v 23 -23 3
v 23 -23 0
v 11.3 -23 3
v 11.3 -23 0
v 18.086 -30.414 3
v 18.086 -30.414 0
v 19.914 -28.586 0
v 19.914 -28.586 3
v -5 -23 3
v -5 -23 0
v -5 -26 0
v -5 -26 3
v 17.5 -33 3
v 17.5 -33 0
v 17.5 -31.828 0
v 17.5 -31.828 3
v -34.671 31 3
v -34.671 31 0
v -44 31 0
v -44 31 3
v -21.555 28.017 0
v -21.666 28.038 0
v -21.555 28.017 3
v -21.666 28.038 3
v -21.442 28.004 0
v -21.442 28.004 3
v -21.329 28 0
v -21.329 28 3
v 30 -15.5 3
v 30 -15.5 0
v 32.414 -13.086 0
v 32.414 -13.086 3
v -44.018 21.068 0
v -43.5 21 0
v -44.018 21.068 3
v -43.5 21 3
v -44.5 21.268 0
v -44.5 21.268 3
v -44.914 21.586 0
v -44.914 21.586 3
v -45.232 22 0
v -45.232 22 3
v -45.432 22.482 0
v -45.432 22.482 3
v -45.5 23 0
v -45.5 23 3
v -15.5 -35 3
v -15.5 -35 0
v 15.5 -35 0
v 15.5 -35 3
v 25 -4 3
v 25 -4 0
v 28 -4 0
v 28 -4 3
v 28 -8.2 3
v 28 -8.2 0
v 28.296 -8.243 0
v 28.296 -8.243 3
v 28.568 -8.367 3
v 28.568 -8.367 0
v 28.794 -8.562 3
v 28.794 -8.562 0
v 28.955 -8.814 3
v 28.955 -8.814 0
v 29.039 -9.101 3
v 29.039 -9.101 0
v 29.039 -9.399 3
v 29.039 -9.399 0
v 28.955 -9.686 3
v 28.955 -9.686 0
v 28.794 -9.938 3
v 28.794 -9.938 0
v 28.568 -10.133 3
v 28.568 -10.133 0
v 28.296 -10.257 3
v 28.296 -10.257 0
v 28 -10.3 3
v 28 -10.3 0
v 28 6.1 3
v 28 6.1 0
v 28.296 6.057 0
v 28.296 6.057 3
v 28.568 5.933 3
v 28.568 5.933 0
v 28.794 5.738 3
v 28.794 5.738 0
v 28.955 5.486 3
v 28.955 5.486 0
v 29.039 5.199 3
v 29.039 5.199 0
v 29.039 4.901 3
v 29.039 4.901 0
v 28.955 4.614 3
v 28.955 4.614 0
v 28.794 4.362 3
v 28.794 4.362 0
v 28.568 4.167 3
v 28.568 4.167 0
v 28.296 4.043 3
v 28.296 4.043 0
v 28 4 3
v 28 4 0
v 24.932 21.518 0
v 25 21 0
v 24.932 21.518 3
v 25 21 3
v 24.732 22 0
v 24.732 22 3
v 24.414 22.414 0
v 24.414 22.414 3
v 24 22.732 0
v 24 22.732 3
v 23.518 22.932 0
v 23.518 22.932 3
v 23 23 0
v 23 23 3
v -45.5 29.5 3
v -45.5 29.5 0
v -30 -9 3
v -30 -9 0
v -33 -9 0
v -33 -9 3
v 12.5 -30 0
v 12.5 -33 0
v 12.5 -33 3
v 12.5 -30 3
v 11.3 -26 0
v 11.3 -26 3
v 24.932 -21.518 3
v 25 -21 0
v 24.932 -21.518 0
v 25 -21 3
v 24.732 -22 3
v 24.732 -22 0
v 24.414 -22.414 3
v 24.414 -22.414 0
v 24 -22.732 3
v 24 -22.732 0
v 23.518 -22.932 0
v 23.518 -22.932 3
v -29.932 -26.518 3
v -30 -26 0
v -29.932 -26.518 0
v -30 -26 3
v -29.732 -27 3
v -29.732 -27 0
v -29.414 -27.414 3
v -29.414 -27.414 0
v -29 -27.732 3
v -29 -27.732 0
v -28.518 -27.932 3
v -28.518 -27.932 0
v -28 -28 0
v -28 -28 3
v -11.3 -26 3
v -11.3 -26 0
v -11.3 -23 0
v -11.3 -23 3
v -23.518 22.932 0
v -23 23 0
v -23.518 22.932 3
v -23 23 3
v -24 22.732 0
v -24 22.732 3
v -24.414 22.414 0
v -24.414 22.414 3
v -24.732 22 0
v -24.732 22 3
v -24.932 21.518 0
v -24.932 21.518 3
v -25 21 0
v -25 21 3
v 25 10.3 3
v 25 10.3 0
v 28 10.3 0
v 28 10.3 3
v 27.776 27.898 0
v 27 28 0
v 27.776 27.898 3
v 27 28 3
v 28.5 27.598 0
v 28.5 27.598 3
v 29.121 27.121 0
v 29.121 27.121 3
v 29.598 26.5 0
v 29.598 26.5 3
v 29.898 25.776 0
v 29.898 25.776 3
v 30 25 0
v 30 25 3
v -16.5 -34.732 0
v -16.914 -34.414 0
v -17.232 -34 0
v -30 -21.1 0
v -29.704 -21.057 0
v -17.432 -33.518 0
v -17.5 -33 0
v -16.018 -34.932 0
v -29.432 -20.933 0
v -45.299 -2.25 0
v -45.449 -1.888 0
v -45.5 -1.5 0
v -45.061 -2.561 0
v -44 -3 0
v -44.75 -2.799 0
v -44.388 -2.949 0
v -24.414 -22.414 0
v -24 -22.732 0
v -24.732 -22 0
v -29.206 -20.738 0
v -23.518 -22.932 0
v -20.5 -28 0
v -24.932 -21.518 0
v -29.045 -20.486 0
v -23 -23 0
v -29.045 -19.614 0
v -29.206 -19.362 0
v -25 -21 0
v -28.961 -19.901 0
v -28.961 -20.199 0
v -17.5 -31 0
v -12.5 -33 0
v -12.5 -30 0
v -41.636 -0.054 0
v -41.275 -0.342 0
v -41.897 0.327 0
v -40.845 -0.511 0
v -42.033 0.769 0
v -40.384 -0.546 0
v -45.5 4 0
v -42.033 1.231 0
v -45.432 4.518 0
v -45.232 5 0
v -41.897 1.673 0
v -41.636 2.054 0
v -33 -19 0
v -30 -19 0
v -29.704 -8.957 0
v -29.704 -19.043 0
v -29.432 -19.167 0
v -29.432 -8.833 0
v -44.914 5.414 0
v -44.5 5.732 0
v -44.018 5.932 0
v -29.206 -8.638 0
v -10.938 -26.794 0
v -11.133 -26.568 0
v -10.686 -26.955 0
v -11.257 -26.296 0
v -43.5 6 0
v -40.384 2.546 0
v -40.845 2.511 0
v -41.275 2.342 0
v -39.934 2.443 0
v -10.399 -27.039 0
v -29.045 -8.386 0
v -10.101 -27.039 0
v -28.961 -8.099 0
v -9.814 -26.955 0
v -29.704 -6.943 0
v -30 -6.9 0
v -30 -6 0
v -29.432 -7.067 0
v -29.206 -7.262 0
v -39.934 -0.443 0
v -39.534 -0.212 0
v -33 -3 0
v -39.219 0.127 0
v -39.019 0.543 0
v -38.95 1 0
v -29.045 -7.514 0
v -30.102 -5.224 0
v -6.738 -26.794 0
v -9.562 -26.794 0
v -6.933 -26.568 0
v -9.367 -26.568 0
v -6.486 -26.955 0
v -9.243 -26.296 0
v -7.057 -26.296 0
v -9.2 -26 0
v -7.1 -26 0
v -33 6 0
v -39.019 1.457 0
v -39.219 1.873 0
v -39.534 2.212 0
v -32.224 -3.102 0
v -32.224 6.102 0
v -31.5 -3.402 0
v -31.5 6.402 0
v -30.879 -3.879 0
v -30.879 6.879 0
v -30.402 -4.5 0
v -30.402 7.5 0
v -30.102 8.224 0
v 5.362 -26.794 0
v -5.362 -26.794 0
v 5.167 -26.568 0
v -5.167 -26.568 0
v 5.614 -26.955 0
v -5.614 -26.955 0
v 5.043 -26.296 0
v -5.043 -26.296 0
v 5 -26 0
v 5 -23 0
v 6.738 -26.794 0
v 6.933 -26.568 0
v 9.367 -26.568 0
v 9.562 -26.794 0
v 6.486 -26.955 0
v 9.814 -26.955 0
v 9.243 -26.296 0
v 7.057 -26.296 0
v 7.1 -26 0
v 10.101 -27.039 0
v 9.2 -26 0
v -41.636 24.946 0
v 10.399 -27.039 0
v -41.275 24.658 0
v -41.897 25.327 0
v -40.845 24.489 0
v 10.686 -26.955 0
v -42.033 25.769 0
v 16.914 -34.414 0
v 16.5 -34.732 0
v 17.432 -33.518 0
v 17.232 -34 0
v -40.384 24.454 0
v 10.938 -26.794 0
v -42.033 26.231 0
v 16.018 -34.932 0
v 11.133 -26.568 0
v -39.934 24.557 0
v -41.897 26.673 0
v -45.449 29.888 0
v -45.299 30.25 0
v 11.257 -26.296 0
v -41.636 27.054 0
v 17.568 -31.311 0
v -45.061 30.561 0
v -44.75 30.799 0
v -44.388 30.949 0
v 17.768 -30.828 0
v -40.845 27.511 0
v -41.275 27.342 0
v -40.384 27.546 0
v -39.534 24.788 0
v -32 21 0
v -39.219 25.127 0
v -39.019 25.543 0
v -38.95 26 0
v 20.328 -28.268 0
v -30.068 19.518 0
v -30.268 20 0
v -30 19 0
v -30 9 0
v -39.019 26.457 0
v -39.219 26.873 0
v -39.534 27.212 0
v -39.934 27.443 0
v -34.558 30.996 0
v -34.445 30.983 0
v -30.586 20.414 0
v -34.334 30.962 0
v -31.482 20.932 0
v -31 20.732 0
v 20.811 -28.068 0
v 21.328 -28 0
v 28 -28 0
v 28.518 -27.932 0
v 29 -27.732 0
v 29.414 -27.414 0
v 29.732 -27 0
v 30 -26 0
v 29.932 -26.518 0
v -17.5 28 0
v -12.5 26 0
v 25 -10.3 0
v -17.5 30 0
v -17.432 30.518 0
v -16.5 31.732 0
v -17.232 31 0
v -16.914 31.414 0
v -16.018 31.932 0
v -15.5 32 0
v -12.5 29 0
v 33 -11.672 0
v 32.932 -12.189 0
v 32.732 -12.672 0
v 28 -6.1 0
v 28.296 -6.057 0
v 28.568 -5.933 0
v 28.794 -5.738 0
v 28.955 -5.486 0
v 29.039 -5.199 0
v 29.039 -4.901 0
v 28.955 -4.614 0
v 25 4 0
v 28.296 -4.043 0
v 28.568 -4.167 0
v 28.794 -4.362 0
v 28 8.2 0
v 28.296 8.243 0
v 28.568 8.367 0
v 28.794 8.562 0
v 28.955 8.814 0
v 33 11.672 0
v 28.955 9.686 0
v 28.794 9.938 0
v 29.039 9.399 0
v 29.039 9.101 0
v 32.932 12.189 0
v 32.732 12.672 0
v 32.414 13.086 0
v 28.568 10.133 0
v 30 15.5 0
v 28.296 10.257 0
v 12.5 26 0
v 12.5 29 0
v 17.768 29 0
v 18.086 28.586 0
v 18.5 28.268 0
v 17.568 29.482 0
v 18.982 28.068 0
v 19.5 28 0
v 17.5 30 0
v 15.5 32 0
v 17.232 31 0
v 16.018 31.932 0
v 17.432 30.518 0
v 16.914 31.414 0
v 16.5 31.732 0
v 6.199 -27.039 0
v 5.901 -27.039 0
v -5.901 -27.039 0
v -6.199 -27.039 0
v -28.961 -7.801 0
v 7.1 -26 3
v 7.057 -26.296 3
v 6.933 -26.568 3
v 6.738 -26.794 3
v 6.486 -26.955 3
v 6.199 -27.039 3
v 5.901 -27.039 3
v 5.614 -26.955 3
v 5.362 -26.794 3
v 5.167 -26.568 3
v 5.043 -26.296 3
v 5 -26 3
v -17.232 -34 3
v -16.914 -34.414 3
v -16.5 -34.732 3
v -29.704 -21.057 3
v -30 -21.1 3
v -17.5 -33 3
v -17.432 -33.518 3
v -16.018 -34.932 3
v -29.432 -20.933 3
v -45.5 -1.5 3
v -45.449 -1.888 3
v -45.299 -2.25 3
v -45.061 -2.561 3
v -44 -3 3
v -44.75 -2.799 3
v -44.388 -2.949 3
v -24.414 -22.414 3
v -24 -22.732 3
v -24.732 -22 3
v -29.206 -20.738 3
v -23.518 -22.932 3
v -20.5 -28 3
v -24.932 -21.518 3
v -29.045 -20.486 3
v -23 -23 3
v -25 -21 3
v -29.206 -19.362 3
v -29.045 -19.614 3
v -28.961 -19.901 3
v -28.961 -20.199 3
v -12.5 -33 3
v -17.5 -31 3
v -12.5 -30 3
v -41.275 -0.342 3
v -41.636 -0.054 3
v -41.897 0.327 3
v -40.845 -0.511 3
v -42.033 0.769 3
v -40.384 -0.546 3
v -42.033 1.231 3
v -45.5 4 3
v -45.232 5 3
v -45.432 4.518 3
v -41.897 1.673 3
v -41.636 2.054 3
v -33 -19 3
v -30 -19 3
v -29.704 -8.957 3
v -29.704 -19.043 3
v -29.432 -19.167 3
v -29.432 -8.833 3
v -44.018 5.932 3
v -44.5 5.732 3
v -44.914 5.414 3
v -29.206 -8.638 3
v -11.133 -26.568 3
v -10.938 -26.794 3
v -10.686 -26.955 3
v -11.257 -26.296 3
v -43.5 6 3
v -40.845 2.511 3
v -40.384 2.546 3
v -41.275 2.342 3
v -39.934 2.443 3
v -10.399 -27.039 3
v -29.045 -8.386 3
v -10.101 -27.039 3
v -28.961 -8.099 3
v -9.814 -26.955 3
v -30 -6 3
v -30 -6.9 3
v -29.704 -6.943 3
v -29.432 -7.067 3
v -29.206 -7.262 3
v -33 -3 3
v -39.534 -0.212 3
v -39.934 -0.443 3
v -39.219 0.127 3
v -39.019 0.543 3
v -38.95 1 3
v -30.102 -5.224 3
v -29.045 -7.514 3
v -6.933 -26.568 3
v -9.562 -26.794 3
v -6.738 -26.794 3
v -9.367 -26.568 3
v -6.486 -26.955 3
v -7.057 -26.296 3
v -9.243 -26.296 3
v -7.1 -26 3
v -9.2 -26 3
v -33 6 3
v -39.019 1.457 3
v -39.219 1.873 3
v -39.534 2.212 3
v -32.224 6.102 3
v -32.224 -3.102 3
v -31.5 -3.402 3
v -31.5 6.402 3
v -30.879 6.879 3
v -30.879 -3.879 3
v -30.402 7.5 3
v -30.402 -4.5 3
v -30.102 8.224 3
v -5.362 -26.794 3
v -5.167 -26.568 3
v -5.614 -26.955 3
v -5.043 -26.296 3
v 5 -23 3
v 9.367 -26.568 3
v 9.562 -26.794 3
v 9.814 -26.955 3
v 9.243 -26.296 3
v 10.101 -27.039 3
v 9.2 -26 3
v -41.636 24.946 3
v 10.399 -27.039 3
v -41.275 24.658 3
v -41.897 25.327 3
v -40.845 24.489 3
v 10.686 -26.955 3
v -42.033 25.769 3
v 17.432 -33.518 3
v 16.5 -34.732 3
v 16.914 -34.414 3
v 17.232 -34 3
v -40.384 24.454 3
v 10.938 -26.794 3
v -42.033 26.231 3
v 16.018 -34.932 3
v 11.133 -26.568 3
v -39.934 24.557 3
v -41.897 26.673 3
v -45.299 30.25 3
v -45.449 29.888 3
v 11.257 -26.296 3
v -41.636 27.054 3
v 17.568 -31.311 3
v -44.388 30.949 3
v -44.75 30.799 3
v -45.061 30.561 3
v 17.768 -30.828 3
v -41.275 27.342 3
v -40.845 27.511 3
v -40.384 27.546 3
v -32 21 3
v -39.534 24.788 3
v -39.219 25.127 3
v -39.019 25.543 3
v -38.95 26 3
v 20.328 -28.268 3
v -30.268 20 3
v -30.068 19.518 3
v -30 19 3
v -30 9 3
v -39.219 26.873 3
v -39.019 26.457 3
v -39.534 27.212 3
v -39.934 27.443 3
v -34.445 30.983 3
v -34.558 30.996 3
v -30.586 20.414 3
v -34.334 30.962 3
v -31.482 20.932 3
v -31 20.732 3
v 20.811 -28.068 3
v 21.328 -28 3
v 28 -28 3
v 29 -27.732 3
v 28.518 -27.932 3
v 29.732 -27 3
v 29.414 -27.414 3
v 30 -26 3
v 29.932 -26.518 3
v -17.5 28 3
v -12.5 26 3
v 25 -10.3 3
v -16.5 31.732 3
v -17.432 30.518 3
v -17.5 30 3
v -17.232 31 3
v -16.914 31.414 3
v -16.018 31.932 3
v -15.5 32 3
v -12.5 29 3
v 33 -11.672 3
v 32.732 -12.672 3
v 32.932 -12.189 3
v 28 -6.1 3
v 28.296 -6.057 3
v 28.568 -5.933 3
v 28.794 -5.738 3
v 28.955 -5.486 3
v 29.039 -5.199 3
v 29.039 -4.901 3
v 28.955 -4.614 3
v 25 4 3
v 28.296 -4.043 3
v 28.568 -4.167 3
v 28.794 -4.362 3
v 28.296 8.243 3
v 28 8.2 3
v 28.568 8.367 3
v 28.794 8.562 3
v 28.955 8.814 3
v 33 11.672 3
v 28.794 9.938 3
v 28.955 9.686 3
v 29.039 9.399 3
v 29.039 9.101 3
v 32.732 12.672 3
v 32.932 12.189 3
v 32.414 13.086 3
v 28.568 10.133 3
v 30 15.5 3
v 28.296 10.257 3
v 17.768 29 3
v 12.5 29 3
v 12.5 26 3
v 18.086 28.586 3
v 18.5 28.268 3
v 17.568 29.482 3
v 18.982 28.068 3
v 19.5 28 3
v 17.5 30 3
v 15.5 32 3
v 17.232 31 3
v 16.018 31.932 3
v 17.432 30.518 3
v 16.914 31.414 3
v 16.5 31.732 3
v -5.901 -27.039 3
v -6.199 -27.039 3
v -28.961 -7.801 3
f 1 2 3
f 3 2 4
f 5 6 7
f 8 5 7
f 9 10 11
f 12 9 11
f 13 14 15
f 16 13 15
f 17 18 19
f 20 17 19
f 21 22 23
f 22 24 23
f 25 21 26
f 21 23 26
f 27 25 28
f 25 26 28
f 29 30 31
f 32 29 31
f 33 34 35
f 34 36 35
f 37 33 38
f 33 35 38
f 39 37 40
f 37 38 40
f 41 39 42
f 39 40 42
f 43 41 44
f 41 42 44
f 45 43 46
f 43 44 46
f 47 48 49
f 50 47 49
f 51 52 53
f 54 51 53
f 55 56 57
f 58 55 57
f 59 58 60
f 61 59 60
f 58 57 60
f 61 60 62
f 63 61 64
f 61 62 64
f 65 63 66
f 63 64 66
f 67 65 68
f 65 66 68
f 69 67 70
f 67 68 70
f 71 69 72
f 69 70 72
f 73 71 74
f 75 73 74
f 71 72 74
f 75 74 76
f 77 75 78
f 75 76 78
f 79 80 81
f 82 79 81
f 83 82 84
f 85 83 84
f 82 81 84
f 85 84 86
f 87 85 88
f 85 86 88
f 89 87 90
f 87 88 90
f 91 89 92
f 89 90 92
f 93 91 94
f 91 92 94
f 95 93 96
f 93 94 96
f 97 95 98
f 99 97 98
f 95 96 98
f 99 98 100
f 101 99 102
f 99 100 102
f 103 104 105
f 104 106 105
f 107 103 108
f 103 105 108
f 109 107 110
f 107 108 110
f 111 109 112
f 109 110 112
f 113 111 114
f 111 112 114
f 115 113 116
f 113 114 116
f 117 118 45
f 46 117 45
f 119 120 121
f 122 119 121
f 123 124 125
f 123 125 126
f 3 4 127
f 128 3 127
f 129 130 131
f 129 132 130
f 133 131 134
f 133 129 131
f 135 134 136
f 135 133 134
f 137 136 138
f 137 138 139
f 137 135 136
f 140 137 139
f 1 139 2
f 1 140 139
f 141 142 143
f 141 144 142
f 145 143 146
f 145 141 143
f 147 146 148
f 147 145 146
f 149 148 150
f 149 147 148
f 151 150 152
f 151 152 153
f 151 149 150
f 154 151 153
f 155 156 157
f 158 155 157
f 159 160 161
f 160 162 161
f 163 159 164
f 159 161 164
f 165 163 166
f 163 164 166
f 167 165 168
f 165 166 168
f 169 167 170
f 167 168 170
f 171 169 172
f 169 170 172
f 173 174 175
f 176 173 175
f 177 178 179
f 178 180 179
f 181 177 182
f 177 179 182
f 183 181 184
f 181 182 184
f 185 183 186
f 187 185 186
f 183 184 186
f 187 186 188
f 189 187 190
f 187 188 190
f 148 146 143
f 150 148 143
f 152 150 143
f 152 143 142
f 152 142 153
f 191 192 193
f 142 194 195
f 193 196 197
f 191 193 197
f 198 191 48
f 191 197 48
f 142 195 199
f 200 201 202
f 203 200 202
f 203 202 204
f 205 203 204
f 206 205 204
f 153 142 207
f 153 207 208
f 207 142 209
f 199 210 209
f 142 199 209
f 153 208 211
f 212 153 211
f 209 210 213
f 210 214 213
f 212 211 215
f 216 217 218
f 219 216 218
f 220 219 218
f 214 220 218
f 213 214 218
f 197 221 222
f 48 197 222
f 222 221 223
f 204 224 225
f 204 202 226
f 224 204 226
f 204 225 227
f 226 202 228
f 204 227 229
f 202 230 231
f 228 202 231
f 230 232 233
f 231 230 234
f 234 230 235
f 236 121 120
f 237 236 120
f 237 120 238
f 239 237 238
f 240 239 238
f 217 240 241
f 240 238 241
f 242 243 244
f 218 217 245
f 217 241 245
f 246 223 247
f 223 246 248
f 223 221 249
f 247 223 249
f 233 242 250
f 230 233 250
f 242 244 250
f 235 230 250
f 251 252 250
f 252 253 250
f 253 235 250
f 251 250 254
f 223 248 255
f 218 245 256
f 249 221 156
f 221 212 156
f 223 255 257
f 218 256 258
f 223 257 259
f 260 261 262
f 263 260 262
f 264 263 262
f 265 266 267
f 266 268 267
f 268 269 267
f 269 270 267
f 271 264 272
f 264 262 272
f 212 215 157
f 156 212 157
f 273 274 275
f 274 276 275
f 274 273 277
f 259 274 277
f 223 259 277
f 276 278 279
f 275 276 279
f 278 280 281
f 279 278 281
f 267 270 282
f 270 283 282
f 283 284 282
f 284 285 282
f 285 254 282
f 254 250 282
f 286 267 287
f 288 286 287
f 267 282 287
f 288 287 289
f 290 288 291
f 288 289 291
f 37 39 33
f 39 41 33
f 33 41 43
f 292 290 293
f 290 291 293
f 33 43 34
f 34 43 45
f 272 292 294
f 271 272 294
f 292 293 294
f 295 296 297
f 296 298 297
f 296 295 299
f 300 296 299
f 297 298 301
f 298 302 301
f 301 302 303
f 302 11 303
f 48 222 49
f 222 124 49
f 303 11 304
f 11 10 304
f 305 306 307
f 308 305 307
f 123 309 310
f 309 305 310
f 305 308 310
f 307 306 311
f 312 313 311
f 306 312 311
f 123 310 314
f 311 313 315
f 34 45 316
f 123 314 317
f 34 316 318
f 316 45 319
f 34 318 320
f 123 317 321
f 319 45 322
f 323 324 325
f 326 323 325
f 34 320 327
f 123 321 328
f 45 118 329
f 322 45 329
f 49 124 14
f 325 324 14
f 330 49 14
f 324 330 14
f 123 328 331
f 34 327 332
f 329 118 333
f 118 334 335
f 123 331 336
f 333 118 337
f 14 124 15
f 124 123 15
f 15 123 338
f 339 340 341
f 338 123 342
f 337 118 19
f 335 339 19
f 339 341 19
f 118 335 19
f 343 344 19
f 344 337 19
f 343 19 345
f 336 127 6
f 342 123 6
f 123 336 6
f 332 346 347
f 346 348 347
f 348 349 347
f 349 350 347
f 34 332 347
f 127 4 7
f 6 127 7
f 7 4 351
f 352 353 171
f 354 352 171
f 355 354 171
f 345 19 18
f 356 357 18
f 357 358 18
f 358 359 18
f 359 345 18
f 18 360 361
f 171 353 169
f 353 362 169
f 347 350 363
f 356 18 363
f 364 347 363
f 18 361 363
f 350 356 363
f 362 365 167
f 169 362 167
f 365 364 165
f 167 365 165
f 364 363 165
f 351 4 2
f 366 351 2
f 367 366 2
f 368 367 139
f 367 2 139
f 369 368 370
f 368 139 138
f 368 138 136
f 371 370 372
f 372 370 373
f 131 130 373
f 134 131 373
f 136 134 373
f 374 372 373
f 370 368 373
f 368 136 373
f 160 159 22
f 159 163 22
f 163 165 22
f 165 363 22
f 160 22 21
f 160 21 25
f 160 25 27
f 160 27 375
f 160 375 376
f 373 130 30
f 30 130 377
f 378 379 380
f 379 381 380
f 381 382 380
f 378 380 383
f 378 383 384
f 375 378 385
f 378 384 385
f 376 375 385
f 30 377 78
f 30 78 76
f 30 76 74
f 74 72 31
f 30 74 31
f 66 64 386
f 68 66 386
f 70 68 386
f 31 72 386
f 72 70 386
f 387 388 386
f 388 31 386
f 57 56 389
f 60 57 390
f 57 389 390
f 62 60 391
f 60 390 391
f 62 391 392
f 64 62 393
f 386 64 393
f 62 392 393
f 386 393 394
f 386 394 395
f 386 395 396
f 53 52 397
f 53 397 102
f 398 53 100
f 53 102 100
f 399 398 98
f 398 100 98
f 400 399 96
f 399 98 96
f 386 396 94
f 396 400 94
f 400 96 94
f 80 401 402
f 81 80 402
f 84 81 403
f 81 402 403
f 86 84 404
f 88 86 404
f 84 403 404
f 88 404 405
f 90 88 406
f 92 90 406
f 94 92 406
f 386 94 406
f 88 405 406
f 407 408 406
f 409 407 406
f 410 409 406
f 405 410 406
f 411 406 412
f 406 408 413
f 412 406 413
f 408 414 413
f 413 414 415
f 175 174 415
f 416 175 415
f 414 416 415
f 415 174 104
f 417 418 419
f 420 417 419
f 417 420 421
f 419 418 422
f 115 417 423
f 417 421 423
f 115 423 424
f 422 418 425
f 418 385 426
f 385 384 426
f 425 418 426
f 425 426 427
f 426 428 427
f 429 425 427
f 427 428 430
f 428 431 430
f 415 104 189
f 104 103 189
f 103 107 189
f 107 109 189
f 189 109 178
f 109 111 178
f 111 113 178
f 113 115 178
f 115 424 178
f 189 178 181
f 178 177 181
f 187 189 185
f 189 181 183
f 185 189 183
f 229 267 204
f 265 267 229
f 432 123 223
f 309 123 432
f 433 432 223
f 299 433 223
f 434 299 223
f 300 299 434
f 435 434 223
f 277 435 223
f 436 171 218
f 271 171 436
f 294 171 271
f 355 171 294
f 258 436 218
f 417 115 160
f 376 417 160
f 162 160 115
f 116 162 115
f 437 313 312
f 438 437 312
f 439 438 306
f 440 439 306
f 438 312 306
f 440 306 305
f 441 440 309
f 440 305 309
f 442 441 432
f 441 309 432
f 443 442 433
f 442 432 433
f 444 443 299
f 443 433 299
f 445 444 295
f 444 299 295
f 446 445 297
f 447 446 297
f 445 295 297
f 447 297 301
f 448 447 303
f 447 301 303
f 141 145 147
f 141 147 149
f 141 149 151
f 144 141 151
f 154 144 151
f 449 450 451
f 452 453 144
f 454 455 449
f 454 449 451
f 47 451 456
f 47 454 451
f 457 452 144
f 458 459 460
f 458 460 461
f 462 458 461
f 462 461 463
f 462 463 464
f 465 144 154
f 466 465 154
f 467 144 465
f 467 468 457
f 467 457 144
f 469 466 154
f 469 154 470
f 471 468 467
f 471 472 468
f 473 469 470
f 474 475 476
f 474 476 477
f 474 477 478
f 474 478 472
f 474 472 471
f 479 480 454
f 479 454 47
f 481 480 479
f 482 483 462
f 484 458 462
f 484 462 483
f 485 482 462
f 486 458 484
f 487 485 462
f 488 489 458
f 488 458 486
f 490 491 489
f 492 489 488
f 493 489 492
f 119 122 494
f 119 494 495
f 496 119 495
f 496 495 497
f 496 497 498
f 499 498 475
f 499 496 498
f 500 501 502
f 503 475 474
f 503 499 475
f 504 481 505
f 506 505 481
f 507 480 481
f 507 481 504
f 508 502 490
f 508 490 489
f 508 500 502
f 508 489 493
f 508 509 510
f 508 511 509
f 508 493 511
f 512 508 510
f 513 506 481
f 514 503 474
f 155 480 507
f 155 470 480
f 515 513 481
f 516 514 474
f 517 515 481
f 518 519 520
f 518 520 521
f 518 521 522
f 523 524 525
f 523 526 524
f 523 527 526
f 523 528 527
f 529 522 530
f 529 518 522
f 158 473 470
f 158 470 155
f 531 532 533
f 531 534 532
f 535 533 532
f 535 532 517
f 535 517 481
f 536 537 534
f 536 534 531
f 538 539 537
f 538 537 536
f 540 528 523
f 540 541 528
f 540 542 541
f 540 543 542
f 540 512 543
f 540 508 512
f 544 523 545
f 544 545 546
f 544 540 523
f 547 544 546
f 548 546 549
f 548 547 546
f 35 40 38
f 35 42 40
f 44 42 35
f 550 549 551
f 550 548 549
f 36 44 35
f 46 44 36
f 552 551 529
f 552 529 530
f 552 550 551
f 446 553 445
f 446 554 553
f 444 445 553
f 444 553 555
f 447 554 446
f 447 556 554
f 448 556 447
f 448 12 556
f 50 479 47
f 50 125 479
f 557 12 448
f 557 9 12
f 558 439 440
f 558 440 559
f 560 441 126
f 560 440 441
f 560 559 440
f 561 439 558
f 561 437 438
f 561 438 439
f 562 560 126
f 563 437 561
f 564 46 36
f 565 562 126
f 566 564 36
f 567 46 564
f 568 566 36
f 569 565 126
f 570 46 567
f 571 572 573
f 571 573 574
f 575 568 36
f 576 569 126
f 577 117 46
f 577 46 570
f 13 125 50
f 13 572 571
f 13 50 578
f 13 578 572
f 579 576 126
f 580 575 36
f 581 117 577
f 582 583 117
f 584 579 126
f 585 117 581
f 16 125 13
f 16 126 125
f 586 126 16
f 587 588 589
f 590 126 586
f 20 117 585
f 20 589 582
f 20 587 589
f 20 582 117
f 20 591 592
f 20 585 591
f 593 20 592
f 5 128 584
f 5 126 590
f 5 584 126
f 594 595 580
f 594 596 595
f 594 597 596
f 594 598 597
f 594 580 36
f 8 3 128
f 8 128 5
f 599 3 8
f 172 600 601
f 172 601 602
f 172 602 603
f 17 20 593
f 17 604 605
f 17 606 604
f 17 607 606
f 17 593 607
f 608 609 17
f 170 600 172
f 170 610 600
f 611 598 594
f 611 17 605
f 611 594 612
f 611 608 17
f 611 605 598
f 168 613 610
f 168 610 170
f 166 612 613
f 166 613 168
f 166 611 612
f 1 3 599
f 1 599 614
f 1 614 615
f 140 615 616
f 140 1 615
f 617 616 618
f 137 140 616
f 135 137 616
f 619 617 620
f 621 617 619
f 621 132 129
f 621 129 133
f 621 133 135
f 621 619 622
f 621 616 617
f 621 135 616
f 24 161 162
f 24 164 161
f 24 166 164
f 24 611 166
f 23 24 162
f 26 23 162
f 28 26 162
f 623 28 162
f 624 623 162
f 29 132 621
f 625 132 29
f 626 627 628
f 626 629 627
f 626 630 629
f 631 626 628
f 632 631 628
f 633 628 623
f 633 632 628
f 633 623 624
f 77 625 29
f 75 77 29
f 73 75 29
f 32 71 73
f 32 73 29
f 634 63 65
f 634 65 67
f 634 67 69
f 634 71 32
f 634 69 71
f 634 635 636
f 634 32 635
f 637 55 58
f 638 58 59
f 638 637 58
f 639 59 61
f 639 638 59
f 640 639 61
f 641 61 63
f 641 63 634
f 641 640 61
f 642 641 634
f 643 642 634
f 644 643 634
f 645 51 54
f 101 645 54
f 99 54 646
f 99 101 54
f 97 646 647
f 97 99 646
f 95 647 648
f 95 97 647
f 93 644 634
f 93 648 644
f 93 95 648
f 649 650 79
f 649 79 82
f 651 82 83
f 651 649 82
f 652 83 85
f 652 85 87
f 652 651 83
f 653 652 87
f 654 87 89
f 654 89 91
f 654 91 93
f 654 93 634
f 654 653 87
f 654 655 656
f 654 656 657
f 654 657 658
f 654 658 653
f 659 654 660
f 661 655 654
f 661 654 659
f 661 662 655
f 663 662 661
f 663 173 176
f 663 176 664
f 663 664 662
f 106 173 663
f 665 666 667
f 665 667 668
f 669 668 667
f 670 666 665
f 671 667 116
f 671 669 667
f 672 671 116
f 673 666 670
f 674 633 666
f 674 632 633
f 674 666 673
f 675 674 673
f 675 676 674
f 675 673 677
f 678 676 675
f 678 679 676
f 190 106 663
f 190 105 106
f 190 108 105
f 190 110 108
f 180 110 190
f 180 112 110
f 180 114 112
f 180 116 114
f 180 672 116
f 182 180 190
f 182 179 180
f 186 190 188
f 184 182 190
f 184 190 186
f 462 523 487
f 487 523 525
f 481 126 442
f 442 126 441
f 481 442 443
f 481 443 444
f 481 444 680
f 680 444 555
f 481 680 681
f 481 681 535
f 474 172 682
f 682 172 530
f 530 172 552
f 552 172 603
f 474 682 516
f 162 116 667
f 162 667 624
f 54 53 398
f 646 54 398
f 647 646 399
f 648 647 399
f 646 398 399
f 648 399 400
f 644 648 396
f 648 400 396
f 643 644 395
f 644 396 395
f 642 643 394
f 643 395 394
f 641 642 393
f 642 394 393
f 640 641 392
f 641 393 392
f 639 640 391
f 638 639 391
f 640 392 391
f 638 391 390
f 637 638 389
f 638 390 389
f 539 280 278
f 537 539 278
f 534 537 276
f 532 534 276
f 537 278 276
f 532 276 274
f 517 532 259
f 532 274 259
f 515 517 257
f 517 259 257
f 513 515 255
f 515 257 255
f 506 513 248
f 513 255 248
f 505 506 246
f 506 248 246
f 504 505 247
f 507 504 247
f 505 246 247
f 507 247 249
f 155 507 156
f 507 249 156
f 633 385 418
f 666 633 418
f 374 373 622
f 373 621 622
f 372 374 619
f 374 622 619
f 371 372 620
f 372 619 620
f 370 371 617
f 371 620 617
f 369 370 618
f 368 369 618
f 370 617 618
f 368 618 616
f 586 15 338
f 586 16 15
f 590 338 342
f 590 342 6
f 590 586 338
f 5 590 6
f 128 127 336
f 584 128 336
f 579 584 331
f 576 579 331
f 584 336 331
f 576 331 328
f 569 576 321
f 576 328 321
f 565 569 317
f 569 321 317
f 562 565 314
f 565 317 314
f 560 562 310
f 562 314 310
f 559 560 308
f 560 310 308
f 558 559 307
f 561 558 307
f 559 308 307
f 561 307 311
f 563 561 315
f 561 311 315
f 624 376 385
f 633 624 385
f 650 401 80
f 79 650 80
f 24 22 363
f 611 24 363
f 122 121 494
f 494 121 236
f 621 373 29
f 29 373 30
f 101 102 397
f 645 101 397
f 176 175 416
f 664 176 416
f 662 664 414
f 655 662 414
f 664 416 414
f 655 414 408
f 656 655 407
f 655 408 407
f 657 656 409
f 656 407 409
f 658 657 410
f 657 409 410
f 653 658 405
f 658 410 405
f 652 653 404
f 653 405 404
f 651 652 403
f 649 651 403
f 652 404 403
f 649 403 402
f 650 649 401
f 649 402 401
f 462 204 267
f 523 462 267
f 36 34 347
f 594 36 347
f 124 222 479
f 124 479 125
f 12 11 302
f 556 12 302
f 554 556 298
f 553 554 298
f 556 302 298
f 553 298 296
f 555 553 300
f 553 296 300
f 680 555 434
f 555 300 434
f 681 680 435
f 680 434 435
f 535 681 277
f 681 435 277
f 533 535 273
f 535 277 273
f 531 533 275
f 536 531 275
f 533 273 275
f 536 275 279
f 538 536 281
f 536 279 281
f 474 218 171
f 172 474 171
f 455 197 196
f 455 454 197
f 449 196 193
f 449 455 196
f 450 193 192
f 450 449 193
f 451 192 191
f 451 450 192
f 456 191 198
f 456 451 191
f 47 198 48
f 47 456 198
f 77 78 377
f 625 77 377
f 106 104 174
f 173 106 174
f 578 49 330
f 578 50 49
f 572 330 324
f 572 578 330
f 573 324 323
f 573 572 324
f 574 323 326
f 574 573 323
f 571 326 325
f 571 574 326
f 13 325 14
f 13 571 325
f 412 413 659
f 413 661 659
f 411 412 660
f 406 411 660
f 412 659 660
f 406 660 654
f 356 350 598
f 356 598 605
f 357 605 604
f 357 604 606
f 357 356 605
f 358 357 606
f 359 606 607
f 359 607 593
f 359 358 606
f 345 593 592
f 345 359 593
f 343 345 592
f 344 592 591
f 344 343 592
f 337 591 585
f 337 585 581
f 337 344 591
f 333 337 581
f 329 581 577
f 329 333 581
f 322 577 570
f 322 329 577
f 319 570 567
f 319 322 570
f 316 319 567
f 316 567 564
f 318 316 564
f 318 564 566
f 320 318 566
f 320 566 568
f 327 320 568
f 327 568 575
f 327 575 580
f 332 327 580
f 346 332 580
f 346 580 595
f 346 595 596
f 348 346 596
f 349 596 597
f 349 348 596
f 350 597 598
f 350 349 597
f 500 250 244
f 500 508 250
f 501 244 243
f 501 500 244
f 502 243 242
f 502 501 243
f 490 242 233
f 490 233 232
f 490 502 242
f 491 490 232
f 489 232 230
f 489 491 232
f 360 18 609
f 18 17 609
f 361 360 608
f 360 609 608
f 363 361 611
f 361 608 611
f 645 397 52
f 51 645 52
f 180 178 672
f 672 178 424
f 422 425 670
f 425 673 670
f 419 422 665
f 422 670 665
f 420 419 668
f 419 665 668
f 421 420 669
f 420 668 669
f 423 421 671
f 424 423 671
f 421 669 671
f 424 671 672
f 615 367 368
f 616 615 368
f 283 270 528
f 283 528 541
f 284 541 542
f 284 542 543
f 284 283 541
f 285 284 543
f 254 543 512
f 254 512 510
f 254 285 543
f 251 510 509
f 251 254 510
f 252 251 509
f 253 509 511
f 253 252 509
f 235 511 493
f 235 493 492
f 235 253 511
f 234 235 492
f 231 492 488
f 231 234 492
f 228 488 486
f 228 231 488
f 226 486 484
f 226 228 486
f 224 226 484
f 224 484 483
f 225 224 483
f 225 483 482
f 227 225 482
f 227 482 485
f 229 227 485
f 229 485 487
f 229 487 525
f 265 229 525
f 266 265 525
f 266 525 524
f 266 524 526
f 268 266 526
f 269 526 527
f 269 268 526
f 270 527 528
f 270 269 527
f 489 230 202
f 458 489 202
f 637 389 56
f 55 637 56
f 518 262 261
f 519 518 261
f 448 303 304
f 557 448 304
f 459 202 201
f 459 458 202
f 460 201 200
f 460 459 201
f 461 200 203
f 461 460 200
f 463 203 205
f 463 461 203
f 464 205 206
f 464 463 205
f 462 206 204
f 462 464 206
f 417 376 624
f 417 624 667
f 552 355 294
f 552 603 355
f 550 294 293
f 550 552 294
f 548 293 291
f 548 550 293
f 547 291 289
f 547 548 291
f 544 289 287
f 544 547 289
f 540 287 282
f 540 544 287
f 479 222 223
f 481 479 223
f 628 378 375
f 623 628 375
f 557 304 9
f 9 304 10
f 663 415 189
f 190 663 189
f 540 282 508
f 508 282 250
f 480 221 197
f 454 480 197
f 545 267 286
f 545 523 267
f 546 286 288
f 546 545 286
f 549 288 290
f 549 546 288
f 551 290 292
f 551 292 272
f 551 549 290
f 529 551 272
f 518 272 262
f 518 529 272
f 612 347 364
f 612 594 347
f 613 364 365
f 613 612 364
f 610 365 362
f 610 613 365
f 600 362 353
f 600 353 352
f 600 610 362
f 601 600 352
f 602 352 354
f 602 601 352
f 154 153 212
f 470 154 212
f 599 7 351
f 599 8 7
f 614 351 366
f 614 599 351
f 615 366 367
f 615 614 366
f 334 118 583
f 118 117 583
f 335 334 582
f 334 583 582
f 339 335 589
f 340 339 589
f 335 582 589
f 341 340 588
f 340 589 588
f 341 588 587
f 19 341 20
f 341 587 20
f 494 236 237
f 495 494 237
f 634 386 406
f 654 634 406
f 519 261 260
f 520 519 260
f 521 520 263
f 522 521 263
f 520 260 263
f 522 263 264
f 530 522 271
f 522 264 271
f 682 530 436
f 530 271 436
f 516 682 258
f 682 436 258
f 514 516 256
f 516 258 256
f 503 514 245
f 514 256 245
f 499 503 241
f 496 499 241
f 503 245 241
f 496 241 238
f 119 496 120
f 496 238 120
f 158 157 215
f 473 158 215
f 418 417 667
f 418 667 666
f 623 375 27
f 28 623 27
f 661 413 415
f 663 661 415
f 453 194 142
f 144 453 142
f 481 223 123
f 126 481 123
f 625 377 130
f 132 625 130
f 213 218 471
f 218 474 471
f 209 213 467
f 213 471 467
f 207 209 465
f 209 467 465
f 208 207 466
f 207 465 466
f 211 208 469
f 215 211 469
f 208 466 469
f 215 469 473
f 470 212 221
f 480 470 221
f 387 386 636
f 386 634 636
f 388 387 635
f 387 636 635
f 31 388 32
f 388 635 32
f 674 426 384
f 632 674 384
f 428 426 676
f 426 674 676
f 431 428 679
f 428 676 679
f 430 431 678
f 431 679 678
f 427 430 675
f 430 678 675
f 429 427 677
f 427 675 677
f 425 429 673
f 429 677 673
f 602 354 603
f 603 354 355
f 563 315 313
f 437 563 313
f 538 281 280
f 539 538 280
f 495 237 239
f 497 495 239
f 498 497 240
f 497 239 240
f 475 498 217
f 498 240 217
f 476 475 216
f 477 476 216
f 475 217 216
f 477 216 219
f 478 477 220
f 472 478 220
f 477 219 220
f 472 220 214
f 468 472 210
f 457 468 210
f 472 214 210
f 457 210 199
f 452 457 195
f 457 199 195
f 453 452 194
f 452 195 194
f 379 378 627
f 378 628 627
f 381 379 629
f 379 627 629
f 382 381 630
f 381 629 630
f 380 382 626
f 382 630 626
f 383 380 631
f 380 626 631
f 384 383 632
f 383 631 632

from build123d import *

# Parameters (mm, degrees)
SKETCH_1_W      = 25
SKETCH_1_H      = 3
SKETCH_1_R      = 1.55
EXTRUDE_1_DEPTH = 3
FILLET_2_R      = 3
FILLET_4_R      = 2
FILLET_5_R      = 1.5
FILLET_6_R      = 3
FILLET_1_R      = 2


with BuildPart() as part:
    # 草图1 → 凸台-拉伸1 (new body)
    with BuildSketch(Plane.XY):
        with BuildLine():
            Line((-34.5, 31), (-45.5, 31))
            Line((-45.5, 31), (-45.5, 21))
            Line((-45.5, 21), (-30, 21))
            Line((-30, 21), (-30, 6))
            Line((-30, 6), (-45.5, 6))
            Line((-45.5, 6), (-45.5, -3))
            Line((-45.5, -3), (-30, -3))
            Line((-30, -3), (-30, -6.9))
            ThreePointArc((-30, -6.9), (-28.95, -7.95), (-30, -9))
            Line((-30, -9), (-33, -9))
            Line((-33, -9), (-33, -19))
            Line((-33, -19), (-30, -19))
            ThreePointArc((-30, -19), (-28.95, -20.05), (-30, -21.1))
            Line((-30, -21.1), (-30, -28))
            Line((-30, -28), (-20.5, -28))
            Line((-20.5, -28), (-17.5, -31))
            Line((-17.5, -31), (-17.5, -35))
            Line((-17.5, -35), (17.5, -35))
            Line((17.5, -35), (17.5, -31))
            Line((17.5, -31), (20.5, -28))
            Line((20.5, -28), (30, -28))
            Line((30, -28), (30, -15.5))
            Line((30, -15.5), (33, -12.5))
            Line((33, -12.5), (33, 12.5))
            Line((33, 12.5), (30, 15.5))
            Line((30, 15.5), (30, 28))
            Line((30, 28), (17.5, 28))
            Line((17.5, 28), (17.5, 32))
            Line((17.5, 32), (-17.5, 32))
            Line((-17.5, 32), (-17.5, 28))
            Line((-17.5, 28), (-21.5, 28))
            Line((-21.5, 28), (-34.5, 31))
        make_face()
        with Locations((0, -31.5)):
            Rectangle(SKETCH_1_W, SKETCH_1_H, mode=Mode.SUBTRACT)
        with BuildLine():
            Line((25, -10.3), (25, -23))
            Line((25, -23), (11.3, -23))
            Line((11.3, -23), (11.3, -26))
            ThreePointArc((11.3, -26), (10.25, -27.05), (9.2, -26))
            Line((9.2, -26), (7.1, -26))
            ThreePointArc((7.1, -26), (6.05, -27.05), (5, -26))
            Line((5, -26), (5, -23))
            Line((5, -23), (-5, -23))
            Line((-5, -23), (-5, -26))
            ThreePointArc((-5, -26), (-6.05, -27.05), (-7.1, -26))
            Line((-7.1, -26), (-9.2, -26))
            ThreePointArc((-9.2, -26), (-10.25, -27.05), (-11.3, -26))
            Line((-11.3, -26), (-11.3, -23))
            Line((-11.3, -23), (-25, -23))
            Line((-25, -23), (-25, 23))
            Line((-25, 23), (25, 23))
            Line((25, 23), (25, 10.3))
            Line((25, 10.3), (28, 10.3))
            ThreePointArc((28, 10.3), (29.05, 9.25), (28, 8.2))
            Line((28, 8.2), (28, 6.1))
            ThreePointArc((28, 6.1), (29.05, 5.05), (28, 4))
            Line((28, 4), (25, 4))
            Line((25, 4), (25, -4))
            Line((25, -4), (28, -4))
            ThreePointArc((28, -4), (29.05, -5.05), (28, -6.1))
            Line((28, -6.1), (28, -8.2))
            ThreePointArc((28, -8.2), (29.05, -9.25), (28, -10.3))
            Line((28, -10.3), (25, -10.3))
        make_face(mode=Mode.SUBTRACT)
        with Locations((-40.5, 1)):
            Circle(SKETCH_1_R, mode=Mode.SUBTRACT)
        with Locations((-40.5, 26)):
            Circle(SKETCH_1_R, mode=Mode.SUBTRACT)
        with Locations((0, 27.5)):
            Rectangle(SKETCH_1_W, SKETCH_1_H, mode=Mode.SUBTRACT)
    extrude(amount=EXTRUDE_1_DEPTH)

    # 圆角2
    fillet_2_edges = [part.edges().sort_by_distance(p)[0] for p in [
        (30, 28, 1.5),
    ]]
    fillet(fillet_2_edges, radius=FILLET_2_R)

    # 圆角4
    fillet_4_edges = [part.edges().sort_by_distance(p)[0] for p in [
        (-30, 21, 1.5),
    ]]
    fillet(fillet_4_edges, radius=FILLET_4_R)

    # 圆角5
    fillet_5_edges = [part.edges().sort_by_distance(p)[0] for p in [
        (-45.5, -3, 1.5),
        (-45.5, 31, 1.5),
        (-34.5, 31, 1.5),
        (-21.5, 28, 1.5),
    ]]
    fillet(fillet_5_edges, radius=FILLET_5_R)

    # 圆角6
    fillet_6_edges = [part.edges().sort_by_distance(p)[0] for p in [
        (-30, -3, 1.5),
        (-30, 6, 1.5),
    ]]
    fillet(fillet_6_edges, radius=FILLET_6_R)

    # 圆角1
    fillet_1_edges = [part.edges().sort_by_distance(p)[0] for p in [
        (25, 23, 1.5),
        (-25, 23, 1.5),
        (-25, -23, 1.5),
        (25, -23, 1.5),
        (-45.5, 6, 1.5),
        (-45.5, 21, 1.5),
        (-17.5, 32, 1.5),
        (17.5, 32, 1.5),
        (17.5, 28, 1.5),
        (33, 12.5, 1.5),
        (33, -12.5, 1.5),
        (30, -28, 1.5),
        (20.5, -28, 1.5),
        (17.5, -31, 1.5),
        (17.5, -35, 1.5),
        (-17.5, -35, 1.5),
        (-30, -28, 1.5),
    ]]
    fillet(fillet_1_edges, radius=FILLET_1_R - 0.0001)  # a hair under: the kernel refuses the full size


solid = part.part
